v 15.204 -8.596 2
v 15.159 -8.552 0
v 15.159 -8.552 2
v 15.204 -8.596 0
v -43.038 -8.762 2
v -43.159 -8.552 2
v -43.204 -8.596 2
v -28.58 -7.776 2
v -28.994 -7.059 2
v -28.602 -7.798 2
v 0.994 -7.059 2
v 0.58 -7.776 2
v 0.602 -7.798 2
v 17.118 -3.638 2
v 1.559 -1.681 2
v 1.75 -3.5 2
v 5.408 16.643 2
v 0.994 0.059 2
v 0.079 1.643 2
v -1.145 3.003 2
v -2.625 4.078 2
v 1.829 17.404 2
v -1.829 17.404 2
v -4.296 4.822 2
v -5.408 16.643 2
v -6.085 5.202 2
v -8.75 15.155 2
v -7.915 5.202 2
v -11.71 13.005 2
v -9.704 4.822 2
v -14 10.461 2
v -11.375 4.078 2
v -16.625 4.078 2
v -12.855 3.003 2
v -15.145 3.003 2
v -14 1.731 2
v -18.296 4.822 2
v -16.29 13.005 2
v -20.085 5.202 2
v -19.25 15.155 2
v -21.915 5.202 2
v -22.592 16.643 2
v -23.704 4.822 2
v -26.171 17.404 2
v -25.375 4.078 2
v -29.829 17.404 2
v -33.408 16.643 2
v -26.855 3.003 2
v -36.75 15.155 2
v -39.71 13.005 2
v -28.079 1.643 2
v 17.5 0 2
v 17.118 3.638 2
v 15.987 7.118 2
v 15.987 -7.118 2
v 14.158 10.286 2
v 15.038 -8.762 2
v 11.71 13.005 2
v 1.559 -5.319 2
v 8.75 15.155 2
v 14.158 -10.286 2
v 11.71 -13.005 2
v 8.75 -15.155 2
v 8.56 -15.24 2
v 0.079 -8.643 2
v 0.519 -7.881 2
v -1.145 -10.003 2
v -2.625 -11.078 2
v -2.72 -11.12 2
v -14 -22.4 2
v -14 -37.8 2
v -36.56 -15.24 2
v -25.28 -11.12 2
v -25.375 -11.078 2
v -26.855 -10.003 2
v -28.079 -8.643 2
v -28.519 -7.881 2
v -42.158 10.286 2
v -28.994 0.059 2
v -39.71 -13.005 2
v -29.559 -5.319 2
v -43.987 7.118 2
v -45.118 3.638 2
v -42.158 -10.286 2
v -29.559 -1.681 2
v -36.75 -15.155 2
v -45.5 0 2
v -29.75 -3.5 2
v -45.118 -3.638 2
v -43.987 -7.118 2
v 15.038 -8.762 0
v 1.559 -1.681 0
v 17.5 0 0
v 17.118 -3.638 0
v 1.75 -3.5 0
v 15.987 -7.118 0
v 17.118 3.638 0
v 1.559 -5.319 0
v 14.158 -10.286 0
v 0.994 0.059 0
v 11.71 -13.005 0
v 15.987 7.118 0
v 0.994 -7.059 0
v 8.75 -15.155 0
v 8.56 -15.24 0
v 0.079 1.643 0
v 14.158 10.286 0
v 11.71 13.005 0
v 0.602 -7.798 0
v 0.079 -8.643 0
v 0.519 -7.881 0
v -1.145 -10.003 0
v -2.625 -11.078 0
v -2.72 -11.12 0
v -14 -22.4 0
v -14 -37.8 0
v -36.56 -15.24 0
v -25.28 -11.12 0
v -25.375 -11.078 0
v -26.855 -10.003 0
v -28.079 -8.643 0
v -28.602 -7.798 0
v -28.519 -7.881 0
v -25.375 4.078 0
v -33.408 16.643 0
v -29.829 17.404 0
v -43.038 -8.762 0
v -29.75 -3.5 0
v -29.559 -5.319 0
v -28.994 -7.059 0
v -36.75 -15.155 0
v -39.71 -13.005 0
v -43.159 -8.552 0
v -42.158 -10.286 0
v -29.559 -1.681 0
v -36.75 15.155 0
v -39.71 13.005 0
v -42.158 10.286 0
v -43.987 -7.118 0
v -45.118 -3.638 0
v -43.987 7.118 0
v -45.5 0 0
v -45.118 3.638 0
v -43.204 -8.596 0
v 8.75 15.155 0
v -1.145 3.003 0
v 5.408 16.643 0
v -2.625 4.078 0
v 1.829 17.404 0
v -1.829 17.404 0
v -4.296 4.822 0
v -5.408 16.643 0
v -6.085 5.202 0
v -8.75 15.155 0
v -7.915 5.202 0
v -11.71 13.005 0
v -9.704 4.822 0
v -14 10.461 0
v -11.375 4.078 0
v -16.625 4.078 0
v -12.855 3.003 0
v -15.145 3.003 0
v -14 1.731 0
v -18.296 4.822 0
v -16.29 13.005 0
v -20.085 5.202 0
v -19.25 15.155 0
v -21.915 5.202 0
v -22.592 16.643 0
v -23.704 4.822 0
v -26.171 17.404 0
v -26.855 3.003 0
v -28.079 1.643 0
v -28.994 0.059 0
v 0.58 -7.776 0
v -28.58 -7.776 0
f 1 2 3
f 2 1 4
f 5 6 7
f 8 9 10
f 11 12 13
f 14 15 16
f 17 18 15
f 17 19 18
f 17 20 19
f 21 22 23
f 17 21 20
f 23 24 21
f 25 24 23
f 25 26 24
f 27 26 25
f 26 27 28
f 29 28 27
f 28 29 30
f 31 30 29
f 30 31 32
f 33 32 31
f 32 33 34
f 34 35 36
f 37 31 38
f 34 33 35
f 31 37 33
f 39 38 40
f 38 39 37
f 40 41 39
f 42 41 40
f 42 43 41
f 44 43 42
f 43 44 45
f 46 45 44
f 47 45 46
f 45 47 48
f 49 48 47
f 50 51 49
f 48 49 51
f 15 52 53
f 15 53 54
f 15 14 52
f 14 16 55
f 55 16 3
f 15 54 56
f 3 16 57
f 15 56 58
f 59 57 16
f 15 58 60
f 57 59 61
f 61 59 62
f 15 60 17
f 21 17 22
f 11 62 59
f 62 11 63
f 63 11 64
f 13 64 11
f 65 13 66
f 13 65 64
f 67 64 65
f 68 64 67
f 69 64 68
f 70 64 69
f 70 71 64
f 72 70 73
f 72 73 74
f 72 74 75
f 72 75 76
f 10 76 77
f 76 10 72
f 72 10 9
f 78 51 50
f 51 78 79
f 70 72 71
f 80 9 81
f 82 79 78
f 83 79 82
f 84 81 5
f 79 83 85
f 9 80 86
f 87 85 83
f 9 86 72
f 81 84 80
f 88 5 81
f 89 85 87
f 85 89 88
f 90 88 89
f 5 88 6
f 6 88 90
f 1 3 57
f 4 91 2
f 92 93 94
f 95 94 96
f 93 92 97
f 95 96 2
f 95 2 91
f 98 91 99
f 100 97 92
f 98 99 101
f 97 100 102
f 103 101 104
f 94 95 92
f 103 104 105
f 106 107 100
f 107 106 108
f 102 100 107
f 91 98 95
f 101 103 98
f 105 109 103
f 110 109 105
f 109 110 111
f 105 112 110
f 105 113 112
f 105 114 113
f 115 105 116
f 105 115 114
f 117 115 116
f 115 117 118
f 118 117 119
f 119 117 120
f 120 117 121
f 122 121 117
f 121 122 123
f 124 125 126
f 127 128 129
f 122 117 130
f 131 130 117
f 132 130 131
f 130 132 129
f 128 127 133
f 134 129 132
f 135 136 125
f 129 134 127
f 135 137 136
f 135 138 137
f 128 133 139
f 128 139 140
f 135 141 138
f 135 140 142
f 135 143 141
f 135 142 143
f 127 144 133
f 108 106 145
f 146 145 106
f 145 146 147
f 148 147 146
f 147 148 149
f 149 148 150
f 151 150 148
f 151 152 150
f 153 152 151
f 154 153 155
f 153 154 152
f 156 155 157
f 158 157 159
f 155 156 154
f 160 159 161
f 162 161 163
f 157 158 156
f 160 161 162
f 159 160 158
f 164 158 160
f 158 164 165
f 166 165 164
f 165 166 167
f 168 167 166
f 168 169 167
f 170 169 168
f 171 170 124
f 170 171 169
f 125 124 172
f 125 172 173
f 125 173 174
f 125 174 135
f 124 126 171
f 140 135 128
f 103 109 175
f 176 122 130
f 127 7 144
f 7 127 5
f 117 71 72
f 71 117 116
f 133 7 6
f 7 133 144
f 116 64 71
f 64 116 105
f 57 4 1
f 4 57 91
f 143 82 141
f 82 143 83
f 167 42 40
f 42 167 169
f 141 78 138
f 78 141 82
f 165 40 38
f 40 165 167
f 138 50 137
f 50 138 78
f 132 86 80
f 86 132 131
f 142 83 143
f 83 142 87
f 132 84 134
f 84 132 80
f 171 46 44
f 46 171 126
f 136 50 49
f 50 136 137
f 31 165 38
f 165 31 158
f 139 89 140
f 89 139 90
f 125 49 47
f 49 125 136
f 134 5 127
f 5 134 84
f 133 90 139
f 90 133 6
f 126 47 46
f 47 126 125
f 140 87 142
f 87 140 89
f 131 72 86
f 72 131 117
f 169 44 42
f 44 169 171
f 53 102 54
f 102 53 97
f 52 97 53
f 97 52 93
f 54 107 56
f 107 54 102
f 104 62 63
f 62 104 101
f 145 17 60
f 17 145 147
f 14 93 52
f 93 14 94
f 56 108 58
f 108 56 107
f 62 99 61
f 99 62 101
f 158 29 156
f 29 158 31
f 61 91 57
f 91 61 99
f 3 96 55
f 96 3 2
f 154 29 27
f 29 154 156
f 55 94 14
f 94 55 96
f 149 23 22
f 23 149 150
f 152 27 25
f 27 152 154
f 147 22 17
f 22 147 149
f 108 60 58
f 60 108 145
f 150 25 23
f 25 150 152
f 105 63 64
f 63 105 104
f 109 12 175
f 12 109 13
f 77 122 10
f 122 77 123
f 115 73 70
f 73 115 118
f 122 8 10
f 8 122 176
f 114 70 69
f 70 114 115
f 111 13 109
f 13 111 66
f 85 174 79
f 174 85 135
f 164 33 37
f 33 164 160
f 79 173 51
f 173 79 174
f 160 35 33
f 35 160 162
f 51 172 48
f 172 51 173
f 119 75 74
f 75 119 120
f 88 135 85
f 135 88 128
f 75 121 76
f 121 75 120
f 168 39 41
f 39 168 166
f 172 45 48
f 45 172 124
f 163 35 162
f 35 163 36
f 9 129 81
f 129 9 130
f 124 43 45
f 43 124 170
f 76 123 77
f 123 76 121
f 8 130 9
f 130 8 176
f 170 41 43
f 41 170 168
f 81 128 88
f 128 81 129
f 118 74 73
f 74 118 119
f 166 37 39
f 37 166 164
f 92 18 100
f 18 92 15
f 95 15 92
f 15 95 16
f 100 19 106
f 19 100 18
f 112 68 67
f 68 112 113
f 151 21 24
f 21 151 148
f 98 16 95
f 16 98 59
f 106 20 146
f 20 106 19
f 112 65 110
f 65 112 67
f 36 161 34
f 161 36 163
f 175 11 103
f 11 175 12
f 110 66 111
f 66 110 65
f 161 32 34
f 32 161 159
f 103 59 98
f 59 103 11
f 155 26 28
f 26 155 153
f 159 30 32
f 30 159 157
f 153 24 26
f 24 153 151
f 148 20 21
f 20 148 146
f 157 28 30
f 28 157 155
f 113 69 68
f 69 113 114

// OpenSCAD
scale([0.7,0.7,1])
difference(){
difference(){
union(){
translate([-40,0,0]) cylinder(2,25,25);
   cylinder(2,25,25);

 translate([-20,-54,0]) rotate([0,0,45]) 
difference(){
 cube([59,59,2]);
  translate([45,45,-1]) cube([20,20,4]);
}
}
}
 translate([-10,-5,0])
  scale([0.5,0.5,1])
  difference(){
   union(){
  translate([-40,0,-1]) cylinder(4,25,25);
   translate([0,0,-1]) cylinder(4,25,25);

translate([-20,-54,0]) rotate([0,0,45]) 
difference(){
 translate([0,0,-1]) cube([59,59,4]);
translate([45,45,-1]) cube([20,20,4]);
}
}
}
}
